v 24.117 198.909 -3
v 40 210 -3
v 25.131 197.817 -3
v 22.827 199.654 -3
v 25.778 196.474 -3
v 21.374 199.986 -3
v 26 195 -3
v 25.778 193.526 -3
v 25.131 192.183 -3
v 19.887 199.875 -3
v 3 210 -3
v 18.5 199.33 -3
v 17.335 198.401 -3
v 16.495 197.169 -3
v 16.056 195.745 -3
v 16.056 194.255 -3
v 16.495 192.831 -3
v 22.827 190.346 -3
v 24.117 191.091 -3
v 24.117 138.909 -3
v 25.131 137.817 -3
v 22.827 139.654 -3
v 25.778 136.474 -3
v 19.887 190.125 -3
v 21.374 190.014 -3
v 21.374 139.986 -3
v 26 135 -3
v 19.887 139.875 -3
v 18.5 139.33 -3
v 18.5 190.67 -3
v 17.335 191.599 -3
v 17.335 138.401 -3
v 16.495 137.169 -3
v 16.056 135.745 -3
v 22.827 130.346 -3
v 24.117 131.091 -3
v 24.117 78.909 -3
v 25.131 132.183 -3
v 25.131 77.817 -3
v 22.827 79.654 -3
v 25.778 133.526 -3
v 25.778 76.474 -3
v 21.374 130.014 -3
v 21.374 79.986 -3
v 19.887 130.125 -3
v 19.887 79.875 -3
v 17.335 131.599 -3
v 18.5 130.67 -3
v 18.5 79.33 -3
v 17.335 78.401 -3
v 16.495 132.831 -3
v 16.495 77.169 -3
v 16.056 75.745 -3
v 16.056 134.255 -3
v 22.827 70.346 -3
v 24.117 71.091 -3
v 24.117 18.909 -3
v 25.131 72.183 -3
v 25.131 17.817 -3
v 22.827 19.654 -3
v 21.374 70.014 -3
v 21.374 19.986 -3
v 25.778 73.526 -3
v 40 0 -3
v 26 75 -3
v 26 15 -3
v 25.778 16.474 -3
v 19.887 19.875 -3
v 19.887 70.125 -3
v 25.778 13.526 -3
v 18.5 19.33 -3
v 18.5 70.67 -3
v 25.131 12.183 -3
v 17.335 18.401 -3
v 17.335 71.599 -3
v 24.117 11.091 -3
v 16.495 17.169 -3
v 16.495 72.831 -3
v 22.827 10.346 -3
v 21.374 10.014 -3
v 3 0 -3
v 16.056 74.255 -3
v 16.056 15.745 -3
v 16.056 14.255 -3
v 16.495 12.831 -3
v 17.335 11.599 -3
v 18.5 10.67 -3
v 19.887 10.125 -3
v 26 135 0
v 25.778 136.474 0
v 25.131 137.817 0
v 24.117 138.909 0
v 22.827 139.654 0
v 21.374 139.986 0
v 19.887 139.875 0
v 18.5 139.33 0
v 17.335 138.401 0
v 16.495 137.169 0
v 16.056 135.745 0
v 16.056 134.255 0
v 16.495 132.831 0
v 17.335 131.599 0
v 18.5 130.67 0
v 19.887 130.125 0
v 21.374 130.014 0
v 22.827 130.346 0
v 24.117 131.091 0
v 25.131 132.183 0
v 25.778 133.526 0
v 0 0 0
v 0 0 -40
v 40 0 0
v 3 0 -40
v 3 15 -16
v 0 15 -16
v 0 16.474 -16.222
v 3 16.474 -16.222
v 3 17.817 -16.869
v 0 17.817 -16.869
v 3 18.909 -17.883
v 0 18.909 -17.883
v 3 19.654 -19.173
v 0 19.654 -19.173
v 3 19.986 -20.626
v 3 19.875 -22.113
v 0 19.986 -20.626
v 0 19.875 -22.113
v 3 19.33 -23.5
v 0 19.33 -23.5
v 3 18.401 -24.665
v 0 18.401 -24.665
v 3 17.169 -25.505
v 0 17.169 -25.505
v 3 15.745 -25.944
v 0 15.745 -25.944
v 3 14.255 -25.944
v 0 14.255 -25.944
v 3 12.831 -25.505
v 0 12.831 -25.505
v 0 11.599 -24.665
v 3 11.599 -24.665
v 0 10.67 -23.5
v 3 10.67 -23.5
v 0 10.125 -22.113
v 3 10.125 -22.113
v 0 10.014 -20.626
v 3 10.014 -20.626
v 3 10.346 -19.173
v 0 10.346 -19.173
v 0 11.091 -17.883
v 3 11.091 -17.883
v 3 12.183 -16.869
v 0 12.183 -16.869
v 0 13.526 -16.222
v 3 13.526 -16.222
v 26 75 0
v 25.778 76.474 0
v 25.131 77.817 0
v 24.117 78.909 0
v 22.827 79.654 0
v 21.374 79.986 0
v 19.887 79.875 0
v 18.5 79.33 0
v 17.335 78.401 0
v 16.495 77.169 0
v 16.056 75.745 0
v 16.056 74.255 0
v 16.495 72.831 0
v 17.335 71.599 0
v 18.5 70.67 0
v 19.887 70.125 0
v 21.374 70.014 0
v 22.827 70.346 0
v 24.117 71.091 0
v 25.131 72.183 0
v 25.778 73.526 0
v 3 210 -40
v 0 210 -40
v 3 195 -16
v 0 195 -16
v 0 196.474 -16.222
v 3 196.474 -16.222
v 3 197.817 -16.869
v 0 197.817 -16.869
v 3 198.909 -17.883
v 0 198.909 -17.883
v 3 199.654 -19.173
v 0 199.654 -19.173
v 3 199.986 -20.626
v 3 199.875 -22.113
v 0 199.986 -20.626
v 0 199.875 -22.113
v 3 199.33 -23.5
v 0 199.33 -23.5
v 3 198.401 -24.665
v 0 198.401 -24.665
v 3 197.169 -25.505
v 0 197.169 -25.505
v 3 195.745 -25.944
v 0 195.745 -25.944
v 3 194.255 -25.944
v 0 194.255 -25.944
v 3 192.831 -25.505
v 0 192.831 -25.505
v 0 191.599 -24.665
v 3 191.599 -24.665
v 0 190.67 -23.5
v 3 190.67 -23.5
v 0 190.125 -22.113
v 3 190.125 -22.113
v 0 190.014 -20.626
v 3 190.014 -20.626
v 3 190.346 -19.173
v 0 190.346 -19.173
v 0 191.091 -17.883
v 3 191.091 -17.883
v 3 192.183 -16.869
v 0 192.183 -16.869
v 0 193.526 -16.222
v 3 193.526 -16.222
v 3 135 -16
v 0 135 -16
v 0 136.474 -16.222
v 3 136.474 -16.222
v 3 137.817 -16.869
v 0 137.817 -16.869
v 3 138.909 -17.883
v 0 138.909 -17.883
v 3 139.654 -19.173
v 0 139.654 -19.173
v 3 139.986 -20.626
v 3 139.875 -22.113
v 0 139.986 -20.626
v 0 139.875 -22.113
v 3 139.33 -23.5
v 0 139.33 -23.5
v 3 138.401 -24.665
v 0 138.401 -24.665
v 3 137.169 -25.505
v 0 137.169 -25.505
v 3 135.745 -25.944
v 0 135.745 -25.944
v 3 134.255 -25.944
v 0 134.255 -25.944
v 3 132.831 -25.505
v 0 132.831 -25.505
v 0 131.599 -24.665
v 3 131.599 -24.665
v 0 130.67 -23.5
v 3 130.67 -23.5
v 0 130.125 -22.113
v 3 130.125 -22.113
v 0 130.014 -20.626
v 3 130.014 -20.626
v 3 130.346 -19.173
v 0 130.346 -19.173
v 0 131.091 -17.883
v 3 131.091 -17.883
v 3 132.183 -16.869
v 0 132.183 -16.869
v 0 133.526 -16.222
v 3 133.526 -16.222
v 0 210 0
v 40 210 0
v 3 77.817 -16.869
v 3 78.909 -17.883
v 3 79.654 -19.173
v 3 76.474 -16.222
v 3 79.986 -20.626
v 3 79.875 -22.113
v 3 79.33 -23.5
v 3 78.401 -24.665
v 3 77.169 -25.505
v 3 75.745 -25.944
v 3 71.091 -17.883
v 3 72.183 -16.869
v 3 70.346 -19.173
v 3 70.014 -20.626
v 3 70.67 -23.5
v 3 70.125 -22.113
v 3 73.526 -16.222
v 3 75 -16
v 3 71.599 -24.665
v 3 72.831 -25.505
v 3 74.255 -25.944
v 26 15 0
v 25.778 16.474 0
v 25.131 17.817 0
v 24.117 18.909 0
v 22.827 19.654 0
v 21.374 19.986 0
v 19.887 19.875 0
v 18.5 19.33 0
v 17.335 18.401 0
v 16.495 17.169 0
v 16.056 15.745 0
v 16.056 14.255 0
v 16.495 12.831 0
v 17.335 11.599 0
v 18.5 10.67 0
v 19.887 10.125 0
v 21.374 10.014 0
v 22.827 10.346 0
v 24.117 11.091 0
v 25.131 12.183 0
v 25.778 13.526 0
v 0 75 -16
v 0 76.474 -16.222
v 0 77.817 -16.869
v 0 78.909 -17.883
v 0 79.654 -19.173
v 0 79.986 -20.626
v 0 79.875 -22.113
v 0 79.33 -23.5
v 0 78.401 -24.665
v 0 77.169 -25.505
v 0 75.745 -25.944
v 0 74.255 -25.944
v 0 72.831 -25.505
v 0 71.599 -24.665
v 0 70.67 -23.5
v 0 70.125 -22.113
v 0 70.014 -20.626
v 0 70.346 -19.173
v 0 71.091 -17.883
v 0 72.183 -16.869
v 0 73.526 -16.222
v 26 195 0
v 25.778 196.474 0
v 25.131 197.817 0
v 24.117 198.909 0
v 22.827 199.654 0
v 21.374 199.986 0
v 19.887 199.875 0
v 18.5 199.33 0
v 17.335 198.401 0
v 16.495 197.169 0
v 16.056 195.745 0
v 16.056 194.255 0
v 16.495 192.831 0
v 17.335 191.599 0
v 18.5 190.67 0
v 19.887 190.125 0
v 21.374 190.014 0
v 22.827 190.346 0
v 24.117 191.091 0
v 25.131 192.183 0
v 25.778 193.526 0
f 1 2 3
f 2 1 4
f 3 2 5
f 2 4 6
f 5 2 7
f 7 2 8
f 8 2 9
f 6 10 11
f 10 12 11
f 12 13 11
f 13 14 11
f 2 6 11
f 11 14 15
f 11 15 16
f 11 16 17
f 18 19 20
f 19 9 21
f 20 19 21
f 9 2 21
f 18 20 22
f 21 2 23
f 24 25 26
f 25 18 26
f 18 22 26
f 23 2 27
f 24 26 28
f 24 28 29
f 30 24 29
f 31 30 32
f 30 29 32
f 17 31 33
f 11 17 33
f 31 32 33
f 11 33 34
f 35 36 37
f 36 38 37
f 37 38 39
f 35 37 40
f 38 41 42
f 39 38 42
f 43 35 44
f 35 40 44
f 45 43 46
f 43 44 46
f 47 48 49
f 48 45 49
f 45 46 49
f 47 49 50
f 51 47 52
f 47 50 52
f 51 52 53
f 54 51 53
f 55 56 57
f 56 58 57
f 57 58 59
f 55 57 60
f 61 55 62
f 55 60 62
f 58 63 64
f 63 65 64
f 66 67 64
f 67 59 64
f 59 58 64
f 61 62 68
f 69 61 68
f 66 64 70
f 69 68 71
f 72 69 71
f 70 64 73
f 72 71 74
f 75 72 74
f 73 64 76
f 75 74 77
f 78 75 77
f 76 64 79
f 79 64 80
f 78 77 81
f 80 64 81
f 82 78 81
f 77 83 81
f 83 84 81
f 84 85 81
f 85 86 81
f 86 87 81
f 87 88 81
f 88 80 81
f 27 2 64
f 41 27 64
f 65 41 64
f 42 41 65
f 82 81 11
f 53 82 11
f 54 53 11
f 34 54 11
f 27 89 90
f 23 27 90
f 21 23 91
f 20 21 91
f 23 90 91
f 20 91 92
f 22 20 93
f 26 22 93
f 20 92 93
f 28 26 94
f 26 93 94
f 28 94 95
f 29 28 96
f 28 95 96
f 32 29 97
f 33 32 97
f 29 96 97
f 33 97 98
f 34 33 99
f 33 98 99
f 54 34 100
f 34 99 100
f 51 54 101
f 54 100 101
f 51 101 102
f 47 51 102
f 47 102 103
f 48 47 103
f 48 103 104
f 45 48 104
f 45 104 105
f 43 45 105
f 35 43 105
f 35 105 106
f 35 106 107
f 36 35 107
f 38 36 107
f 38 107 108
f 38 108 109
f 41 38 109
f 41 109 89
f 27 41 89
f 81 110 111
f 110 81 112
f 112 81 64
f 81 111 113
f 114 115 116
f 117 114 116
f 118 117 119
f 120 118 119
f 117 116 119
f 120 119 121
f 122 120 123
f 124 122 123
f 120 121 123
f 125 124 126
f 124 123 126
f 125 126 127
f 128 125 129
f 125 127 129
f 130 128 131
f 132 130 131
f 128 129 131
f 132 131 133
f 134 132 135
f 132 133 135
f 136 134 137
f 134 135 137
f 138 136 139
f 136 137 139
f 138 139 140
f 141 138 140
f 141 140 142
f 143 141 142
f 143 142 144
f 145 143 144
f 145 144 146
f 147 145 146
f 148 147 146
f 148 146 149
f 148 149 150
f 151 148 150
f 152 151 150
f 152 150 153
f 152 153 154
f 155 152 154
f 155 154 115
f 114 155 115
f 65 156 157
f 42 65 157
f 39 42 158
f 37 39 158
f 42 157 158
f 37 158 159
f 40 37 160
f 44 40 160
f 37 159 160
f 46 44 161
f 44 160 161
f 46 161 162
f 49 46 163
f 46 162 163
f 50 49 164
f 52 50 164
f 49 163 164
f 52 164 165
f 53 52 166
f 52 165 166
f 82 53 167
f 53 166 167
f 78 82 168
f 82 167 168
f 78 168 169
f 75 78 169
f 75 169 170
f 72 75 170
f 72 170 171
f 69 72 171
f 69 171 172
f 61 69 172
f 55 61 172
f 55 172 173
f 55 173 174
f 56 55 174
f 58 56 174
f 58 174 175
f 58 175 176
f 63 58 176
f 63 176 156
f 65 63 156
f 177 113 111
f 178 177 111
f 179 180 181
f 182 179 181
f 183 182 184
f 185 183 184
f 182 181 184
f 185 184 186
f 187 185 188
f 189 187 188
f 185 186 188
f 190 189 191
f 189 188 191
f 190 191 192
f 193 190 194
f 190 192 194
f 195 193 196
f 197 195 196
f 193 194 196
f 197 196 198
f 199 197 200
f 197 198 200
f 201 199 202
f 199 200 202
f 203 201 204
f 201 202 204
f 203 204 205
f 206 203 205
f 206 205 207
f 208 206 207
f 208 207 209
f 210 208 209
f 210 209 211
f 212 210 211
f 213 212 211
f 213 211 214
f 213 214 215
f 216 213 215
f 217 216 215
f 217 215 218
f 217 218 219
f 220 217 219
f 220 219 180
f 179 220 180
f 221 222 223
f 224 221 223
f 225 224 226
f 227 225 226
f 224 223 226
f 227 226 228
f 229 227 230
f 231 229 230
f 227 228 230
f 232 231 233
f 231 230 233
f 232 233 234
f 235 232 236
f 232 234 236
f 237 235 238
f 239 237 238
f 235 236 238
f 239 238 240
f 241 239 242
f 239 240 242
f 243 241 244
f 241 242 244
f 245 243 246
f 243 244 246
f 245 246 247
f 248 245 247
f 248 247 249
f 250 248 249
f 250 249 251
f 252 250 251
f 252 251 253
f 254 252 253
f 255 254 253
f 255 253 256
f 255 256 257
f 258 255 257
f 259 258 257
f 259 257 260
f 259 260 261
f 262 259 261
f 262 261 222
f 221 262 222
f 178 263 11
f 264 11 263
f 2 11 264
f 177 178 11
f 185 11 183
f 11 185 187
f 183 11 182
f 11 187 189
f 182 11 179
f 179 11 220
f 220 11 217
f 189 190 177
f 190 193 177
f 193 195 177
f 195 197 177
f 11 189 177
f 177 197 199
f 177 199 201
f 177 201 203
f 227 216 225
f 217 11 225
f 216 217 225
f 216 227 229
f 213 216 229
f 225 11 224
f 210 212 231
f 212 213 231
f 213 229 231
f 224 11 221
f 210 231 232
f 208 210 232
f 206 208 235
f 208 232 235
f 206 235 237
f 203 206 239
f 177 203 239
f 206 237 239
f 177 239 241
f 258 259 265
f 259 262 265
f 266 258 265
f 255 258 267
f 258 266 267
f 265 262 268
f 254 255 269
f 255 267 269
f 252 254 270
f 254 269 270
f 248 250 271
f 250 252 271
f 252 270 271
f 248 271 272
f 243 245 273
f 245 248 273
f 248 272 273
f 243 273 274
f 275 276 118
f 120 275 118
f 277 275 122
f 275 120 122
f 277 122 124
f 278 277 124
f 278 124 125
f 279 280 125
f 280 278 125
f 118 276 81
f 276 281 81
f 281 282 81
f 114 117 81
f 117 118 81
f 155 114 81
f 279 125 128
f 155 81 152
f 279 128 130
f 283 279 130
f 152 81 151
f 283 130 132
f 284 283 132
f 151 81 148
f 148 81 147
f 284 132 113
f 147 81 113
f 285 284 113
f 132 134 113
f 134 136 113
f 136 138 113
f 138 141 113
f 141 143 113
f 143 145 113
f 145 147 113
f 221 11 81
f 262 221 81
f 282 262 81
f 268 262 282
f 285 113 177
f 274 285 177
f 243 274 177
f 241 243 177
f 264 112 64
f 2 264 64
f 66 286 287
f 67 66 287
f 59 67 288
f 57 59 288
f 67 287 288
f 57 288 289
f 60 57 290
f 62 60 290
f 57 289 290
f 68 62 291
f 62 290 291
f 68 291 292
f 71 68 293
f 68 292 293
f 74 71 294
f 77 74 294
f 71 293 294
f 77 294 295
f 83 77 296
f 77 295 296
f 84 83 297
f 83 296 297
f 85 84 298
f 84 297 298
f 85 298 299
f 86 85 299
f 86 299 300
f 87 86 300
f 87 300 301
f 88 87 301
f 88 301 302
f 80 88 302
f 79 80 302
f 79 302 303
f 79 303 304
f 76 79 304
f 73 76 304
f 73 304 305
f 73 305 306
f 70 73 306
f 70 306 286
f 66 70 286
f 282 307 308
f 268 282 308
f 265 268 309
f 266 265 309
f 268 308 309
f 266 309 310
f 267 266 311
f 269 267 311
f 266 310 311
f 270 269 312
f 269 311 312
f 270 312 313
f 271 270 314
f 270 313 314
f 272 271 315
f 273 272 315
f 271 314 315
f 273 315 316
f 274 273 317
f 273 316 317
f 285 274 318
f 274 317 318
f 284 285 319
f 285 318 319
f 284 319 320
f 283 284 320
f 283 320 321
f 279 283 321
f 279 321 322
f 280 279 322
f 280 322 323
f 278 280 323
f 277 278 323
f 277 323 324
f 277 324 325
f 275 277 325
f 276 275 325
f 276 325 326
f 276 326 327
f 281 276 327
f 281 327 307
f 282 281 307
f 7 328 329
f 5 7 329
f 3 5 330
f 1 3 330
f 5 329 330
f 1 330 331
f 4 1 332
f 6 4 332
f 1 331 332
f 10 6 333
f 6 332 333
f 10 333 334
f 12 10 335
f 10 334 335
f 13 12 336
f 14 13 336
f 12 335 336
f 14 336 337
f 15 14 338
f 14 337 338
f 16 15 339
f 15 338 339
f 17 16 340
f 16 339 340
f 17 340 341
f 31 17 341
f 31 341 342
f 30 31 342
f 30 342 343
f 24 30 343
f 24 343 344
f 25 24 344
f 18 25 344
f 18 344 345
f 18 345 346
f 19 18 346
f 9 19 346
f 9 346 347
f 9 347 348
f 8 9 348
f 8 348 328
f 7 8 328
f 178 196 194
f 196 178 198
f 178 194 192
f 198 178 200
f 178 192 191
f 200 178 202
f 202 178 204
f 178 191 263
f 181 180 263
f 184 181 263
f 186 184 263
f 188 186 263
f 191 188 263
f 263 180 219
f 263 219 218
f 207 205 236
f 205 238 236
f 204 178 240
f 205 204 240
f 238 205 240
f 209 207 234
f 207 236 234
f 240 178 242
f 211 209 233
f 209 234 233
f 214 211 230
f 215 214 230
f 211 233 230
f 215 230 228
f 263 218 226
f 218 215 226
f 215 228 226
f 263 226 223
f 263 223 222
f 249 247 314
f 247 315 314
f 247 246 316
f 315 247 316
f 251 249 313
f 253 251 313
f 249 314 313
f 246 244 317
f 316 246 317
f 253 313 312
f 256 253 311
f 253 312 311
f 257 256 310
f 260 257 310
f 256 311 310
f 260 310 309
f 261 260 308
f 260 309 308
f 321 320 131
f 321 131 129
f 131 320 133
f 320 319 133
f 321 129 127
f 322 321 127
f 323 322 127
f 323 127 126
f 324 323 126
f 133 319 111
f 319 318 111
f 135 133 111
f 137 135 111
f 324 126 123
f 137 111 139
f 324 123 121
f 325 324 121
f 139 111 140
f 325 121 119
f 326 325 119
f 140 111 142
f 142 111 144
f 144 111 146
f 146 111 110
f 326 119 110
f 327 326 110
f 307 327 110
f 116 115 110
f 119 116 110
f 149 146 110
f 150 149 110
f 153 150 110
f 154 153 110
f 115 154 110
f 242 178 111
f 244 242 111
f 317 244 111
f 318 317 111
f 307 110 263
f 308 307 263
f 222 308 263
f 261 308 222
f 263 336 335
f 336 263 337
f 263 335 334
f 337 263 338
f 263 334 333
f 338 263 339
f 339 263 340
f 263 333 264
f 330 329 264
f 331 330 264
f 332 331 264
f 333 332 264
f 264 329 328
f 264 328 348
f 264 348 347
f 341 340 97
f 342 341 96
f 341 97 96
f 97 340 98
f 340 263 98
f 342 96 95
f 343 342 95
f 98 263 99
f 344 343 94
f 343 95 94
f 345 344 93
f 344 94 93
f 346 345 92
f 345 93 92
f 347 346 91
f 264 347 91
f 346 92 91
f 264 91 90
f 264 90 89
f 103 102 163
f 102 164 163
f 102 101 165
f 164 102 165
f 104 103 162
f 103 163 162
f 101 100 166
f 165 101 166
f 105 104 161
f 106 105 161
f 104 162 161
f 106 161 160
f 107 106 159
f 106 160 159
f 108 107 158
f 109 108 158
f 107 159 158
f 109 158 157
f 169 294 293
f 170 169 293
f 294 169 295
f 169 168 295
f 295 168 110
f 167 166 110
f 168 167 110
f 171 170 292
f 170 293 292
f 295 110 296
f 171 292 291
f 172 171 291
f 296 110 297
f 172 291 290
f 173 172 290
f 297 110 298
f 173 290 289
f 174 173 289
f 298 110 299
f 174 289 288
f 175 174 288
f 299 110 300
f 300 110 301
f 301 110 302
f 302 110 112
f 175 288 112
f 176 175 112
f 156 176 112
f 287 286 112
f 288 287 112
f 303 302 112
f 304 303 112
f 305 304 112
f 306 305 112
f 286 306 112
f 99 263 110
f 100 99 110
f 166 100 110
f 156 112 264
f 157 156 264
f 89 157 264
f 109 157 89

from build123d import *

# Parameters (mm, degrees)
EXTRUDE_1_DEPTH     = 210
SKETCH_2_R          = 5
CUT_EXTRUDE_1_DEPTH = 41
SKETCH_3_R          = 5
CUT_EXTRUDE_2_DEPTH = 41


with BuildPart() as part:
    # Эскиз1 → Вытянуть-Тонкостенный1 (new body)
    with BuildSketch(Plane(origin=(0, 0, 0), x_dir=(1, 0, 0), z_dir=(0, 1, 0))):
        Polygon((0, 40), (0, 0), (40, 0), (40, 3), (3, 3), (3, 40), align=None)
    extrude(amount=EXTRUDE_1_DEPTH)

    # Эскиз2 → Вырез-Вытянуть1 (cut, through all)
    with BuildSketch(Plane.ZY):
        with Locations((-21, 15)):
            Circle(SKETCH_2_R)
        with Locations((-21, 75)):
            Circle(SKETCH_2_R)
        with Locations((-21, 135)):
            Circle(SKETCH_2_R)
        with Locations((-21, 195)):
            Circle(SKETCH_2_R)
    extrude(amount=-CUT_EXTRUDE_1_DEPTH, mode=Mode.SUBTRACT)

    # Эскиз3 → Вырез-Вытянуть2 (cut, through all)
    with BuildSketch(Plane.XY):
        with Locations((21, 15)):
            Circle(SKETCH_3_R)
        with Locations((21, 75)):
            Circle(SKETCH_3_R)
        with Locations((21, 135)):
            Circle(SKETCH_3_R)
        with Locations((21, 195)):
            Circle(SKETCH_3_R)
    extrude(amount=-CUT_EXTRUDE_2_DEPTH, mode=Mode.SUBTRACT)


solid = part.part
